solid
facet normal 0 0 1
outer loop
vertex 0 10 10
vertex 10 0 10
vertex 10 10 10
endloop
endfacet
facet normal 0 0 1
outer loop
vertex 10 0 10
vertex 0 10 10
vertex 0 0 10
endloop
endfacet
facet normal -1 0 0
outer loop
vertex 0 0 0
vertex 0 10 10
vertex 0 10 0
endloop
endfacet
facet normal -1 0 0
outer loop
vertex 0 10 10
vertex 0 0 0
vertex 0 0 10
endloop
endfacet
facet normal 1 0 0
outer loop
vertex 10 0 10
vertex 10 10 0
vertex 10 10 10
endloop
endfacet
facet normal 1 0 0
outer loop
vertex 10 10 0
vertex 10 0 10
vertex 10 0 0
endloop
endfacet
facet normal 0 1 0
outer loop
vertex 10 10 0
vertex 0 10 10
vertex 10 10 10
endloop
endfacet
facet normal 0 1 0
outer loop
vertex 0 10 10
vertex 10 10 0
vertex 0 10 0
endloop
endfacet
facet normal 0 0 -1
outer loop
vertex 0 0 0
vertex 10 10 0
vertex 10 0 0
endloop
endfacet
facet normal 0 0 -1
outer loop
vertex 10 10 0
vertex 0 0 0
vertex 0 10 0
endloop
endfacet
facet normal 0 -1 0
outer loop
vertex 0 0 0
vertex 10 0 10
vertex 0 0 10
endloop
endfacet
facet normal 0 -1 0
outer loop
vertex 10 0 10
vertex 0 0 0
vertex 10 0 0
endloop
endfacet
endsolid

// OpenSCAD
// A 2D operand inside a 3D `difference` — the shape where OPENSCAD HANDS BACK A
// SOLID AND WE HAND BACK NOTHING.
//
// 🔴 THIS CASE EXISTS BECAUSE THE HARNESS USED TO BE UNABLE TO SCORE IT. Until
// the REFUSED split (2026-08-11) `oracle.mjs` awarded `REFUSED` as soon as we
// named a construct and emitted nothing — BEFORE either leg was compared — so
// the oracle's own answer was never consulted for a refusal, and a refusal that
// costs a capability was indistinguishable from one that costs nothing. The
// README's own blind-spot map said a case here "cannot go red" and left it out
// for that reason. It can now: the verdict is `STRICTER`, and `STRICTER` is a
// ledger entry, not a pass.
//
// ⚠ NO CONTROL SOLID, DELIBERATELY, AND IT IS THE ONE PLACE THE CONVENTION IS
// WRONG. Every other case whose construct GATES EMISSION carries an
// unconditional second solid so a partial loss is compared instead of scoring a
// safe-looking `REFUSED`. Adding one here would make the case emit geometry, so
// the refusal branch would never be reached and the case would stop testing the
// thing it is for — and it would land as a fresh `DIVERGES` against `CAD1`. The
// split IS the control the convention was standing in for.
//
// MEASURED, `openscad 2026.08.07 --export-format asciistl`, this exact file:
// exit 0, 12 facets — the plain cube, pocket not cut — with two warnings on the
// console ("Mixing 2D and 3D objects is not supported", "Ignoring 2D child
// object for 3D operation"). We refuse the whole node and draw nothing.
//
// 🔴 THE FIX IS NOT "DROP THE 2D OPERAND TO MATCH". That is right here and
// WRONG for `bool_2d_operand_intersection`, where the same edit emits a solid
// OpenSCAD does not emit at all. See `twoDimensionalOperandVerdict()` in
// web/src/cad/mesh.ts for the full measured table.
//
// Watched go red under `--plant drop-2d-operand`, which is that edit: the row
// moves off `STRICTER`, where before the split it could not move at all.
difference() {
  cube([10, 10, 10]);
  circle(r = 3);
}
